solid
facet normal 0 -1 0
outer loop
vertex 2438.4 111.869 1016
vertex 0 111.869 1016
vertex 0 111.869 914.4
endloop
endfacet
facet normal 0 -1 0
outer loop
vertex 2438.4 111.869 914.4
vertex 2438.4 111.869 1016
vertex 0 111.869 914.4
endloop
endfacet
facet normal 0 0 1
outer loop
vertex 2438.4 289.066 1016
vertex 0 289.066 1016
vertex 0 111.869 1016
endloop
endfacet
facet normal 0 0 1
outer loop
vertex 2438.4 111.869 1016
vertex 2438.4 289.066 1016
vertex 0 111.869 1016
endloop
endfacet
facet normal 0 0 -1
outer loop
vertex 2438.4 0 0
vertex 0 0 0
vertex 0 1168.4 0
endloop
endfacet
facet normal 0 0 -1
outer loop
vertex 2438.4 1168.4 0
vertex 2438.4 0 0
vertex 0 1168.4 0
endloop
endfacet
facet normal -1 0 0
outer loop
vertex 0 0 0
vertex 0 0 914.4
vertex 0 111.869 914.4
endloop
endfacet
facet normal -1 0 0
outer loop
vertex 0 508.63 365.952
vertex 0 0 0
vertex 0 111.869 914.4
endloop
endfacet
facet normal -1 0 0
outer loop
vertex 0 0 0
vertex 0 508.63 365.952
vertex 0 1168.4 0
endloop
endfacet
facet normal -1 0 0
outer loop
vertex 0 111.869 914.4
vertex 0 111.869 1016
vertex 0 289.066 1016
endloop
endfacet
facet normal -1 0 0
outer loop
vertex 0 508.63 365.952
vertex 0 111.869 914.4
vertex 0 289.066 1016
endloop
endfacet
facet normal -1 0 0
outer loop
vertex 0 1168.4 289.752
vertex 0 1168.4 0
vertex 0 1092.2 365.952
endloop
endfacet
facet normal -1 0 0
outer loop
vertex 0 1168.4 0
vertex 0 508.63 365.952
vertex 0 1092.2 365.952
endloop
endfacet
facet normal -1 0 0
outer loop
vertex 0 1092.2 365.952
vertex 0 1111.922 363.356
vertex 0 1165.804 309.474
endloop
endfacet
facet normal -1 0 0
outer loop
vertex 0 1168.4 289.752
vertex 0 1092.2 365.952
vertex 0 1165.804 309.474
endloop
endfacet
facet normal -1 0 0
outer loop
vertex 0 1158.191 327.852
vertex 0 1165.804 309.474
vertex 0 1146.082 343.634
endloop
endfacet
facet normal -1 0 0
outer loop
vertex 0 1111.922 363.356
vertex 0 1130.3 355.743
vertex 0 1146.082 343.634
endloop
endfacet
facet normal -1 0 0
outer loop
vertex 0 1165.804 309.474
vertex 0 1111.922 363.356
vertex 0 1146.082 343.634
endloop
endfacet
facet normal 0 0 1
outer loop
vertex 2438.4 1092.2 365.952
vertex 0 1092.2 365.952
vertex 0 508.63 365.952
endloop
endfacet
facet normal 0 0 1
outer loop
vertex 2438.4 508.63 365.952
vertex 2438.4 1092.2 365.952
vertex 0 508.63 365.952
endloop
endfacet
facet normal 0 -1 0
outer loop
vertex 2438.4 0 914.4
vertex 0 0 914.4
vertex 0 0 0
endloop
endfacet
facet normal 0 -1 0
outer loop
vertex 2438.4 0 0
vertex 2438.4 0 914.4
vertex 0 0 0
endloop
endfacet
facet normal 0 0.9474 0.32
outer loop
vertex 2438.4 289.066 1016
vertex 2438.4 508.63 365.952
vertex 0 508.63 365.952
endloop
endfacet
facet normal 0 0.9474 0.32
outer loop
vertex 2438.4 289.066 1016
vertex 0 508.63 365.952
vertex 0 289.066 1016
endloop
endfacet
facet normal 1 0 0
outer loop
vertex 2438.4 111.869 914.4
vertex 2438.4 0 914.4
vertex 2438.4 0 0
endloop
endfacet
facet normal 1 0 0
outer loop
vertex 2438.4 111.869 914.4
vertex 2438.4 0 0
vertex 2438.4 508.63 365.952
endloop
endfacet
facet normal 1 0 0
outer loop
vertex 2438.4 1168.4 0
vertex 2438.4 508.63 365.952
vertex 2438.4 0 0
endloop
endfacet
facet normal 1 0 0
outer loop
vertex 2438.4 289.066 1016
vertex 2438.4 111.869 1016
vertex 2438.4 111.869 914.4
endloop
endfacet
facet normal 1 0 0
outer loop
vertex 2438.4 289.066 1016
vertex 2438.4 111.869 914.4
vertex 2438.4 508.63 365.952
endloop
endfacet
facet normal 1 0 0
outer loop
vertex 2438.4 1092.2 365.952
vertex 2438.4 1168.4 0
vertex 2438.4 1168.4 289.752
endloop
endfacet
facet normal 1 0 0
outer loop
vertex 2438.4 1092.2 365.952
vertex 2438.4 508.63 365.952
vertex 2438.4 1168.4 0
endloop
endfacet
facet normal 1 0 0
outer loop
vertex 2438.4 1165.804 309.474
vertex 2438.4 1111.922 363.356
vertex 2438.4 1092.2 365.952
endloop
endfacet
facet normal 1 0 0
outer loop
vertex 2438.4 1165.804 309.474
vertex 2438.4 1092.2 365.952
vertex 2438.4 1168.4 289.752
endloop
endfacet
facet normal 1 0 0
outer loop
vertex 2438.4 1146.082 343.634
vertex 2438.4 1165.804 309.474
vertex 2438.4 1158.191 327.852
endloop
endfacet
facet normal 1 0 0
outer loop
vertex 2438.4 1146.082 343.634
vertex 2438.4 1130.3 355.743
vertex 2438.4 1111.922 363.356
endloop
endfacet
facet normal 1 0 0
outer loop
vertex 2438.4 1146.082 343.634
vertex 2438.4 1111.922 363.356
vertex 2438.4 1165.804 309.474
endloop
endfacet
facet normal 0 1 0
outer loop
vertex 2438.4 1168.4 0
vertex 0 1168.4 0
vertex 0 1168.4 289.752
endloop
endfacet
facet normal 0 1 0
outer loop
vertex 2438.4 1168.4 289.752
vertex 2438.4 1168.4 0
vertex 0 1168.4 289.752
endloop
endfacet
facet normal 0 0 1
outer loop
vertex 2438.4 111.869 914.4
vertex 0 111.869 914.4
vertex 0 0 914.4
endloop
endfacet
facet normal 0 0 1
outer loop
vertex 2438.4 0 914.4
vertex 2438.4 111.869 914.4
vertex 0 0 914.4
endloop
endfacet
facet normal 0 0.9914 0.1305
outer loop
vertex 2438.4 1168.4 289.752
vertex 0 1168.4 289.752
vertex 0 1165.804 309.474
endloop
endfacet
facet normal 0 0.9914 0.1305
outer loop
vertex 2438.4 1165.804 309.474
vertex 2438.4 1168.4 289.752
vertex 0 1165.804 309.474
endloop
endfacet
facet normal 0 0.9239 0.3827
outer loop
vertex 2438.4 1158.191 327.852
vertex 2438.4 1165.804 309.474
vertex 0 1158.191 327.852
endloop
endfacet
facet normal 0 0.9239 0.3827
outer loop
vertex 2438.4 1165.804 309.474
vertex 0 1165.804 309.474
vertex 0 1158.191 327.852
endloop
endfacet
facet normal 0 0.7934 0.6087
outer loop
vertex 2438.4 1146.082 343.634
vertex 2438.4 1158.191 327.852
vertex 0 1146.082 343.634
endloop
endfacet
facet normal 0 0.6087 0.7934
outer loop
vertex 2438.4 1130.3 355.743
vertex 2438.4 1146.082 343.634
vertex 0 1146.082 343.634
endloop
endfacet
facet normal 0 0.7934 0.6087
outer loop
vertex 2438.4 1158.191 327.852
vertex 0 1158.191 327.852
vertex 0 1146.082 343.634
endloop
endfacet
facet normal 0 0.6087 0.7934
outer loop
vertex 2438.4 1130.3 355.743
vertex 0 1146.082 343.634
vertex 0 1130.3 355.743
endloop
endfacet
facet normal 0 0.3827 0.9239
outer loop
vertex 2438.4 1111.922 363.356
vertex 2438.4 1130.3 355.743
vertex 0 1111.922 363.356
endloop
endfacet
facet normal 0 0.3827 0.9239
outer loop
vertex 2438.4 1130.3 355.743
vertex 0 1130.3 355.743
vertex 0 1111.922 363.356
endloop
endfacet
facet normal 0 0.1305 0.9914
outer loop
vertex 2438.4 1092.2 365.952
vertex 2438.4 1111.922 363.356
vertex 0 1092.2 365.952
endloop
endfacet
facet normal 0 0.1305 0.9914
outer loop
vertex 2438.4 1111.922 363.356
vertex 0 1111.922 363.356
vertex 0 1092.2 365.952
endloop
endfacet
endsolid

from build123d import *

# Parameters (mm, degrees)
F1_DEPTH = 2438.4


with BuildPart() as f1:
    # F0 (on Right) → F1 (new body)
    with BuildSketch(Plane.YZ):
        with BuildLine():
            Line((111.86897, 914.4), (0, 914.4))
            Line((0, 914.4), (0, 0))
            Line((0, 0), (1168.4, 0))
            Line((1168.4, 0), (1168.4, 289.752079))
            ThreePointArc((1168.4, 289.752079), (1146.081537, 343.633616), (1092.2, 365.952079))
            Line((1092.2, 365.952079), (508.629589, 365.952079))
            Line((508.629589, 365.952079), (289.065507, 1016))
            Line((289.065507, 1016), (111.86897, 1016))
            Line((111.86897, 1016), (111.86897, 914.4))
        make_face()
    extrude(amount=F1_DEPTH)


solid = f1.part
